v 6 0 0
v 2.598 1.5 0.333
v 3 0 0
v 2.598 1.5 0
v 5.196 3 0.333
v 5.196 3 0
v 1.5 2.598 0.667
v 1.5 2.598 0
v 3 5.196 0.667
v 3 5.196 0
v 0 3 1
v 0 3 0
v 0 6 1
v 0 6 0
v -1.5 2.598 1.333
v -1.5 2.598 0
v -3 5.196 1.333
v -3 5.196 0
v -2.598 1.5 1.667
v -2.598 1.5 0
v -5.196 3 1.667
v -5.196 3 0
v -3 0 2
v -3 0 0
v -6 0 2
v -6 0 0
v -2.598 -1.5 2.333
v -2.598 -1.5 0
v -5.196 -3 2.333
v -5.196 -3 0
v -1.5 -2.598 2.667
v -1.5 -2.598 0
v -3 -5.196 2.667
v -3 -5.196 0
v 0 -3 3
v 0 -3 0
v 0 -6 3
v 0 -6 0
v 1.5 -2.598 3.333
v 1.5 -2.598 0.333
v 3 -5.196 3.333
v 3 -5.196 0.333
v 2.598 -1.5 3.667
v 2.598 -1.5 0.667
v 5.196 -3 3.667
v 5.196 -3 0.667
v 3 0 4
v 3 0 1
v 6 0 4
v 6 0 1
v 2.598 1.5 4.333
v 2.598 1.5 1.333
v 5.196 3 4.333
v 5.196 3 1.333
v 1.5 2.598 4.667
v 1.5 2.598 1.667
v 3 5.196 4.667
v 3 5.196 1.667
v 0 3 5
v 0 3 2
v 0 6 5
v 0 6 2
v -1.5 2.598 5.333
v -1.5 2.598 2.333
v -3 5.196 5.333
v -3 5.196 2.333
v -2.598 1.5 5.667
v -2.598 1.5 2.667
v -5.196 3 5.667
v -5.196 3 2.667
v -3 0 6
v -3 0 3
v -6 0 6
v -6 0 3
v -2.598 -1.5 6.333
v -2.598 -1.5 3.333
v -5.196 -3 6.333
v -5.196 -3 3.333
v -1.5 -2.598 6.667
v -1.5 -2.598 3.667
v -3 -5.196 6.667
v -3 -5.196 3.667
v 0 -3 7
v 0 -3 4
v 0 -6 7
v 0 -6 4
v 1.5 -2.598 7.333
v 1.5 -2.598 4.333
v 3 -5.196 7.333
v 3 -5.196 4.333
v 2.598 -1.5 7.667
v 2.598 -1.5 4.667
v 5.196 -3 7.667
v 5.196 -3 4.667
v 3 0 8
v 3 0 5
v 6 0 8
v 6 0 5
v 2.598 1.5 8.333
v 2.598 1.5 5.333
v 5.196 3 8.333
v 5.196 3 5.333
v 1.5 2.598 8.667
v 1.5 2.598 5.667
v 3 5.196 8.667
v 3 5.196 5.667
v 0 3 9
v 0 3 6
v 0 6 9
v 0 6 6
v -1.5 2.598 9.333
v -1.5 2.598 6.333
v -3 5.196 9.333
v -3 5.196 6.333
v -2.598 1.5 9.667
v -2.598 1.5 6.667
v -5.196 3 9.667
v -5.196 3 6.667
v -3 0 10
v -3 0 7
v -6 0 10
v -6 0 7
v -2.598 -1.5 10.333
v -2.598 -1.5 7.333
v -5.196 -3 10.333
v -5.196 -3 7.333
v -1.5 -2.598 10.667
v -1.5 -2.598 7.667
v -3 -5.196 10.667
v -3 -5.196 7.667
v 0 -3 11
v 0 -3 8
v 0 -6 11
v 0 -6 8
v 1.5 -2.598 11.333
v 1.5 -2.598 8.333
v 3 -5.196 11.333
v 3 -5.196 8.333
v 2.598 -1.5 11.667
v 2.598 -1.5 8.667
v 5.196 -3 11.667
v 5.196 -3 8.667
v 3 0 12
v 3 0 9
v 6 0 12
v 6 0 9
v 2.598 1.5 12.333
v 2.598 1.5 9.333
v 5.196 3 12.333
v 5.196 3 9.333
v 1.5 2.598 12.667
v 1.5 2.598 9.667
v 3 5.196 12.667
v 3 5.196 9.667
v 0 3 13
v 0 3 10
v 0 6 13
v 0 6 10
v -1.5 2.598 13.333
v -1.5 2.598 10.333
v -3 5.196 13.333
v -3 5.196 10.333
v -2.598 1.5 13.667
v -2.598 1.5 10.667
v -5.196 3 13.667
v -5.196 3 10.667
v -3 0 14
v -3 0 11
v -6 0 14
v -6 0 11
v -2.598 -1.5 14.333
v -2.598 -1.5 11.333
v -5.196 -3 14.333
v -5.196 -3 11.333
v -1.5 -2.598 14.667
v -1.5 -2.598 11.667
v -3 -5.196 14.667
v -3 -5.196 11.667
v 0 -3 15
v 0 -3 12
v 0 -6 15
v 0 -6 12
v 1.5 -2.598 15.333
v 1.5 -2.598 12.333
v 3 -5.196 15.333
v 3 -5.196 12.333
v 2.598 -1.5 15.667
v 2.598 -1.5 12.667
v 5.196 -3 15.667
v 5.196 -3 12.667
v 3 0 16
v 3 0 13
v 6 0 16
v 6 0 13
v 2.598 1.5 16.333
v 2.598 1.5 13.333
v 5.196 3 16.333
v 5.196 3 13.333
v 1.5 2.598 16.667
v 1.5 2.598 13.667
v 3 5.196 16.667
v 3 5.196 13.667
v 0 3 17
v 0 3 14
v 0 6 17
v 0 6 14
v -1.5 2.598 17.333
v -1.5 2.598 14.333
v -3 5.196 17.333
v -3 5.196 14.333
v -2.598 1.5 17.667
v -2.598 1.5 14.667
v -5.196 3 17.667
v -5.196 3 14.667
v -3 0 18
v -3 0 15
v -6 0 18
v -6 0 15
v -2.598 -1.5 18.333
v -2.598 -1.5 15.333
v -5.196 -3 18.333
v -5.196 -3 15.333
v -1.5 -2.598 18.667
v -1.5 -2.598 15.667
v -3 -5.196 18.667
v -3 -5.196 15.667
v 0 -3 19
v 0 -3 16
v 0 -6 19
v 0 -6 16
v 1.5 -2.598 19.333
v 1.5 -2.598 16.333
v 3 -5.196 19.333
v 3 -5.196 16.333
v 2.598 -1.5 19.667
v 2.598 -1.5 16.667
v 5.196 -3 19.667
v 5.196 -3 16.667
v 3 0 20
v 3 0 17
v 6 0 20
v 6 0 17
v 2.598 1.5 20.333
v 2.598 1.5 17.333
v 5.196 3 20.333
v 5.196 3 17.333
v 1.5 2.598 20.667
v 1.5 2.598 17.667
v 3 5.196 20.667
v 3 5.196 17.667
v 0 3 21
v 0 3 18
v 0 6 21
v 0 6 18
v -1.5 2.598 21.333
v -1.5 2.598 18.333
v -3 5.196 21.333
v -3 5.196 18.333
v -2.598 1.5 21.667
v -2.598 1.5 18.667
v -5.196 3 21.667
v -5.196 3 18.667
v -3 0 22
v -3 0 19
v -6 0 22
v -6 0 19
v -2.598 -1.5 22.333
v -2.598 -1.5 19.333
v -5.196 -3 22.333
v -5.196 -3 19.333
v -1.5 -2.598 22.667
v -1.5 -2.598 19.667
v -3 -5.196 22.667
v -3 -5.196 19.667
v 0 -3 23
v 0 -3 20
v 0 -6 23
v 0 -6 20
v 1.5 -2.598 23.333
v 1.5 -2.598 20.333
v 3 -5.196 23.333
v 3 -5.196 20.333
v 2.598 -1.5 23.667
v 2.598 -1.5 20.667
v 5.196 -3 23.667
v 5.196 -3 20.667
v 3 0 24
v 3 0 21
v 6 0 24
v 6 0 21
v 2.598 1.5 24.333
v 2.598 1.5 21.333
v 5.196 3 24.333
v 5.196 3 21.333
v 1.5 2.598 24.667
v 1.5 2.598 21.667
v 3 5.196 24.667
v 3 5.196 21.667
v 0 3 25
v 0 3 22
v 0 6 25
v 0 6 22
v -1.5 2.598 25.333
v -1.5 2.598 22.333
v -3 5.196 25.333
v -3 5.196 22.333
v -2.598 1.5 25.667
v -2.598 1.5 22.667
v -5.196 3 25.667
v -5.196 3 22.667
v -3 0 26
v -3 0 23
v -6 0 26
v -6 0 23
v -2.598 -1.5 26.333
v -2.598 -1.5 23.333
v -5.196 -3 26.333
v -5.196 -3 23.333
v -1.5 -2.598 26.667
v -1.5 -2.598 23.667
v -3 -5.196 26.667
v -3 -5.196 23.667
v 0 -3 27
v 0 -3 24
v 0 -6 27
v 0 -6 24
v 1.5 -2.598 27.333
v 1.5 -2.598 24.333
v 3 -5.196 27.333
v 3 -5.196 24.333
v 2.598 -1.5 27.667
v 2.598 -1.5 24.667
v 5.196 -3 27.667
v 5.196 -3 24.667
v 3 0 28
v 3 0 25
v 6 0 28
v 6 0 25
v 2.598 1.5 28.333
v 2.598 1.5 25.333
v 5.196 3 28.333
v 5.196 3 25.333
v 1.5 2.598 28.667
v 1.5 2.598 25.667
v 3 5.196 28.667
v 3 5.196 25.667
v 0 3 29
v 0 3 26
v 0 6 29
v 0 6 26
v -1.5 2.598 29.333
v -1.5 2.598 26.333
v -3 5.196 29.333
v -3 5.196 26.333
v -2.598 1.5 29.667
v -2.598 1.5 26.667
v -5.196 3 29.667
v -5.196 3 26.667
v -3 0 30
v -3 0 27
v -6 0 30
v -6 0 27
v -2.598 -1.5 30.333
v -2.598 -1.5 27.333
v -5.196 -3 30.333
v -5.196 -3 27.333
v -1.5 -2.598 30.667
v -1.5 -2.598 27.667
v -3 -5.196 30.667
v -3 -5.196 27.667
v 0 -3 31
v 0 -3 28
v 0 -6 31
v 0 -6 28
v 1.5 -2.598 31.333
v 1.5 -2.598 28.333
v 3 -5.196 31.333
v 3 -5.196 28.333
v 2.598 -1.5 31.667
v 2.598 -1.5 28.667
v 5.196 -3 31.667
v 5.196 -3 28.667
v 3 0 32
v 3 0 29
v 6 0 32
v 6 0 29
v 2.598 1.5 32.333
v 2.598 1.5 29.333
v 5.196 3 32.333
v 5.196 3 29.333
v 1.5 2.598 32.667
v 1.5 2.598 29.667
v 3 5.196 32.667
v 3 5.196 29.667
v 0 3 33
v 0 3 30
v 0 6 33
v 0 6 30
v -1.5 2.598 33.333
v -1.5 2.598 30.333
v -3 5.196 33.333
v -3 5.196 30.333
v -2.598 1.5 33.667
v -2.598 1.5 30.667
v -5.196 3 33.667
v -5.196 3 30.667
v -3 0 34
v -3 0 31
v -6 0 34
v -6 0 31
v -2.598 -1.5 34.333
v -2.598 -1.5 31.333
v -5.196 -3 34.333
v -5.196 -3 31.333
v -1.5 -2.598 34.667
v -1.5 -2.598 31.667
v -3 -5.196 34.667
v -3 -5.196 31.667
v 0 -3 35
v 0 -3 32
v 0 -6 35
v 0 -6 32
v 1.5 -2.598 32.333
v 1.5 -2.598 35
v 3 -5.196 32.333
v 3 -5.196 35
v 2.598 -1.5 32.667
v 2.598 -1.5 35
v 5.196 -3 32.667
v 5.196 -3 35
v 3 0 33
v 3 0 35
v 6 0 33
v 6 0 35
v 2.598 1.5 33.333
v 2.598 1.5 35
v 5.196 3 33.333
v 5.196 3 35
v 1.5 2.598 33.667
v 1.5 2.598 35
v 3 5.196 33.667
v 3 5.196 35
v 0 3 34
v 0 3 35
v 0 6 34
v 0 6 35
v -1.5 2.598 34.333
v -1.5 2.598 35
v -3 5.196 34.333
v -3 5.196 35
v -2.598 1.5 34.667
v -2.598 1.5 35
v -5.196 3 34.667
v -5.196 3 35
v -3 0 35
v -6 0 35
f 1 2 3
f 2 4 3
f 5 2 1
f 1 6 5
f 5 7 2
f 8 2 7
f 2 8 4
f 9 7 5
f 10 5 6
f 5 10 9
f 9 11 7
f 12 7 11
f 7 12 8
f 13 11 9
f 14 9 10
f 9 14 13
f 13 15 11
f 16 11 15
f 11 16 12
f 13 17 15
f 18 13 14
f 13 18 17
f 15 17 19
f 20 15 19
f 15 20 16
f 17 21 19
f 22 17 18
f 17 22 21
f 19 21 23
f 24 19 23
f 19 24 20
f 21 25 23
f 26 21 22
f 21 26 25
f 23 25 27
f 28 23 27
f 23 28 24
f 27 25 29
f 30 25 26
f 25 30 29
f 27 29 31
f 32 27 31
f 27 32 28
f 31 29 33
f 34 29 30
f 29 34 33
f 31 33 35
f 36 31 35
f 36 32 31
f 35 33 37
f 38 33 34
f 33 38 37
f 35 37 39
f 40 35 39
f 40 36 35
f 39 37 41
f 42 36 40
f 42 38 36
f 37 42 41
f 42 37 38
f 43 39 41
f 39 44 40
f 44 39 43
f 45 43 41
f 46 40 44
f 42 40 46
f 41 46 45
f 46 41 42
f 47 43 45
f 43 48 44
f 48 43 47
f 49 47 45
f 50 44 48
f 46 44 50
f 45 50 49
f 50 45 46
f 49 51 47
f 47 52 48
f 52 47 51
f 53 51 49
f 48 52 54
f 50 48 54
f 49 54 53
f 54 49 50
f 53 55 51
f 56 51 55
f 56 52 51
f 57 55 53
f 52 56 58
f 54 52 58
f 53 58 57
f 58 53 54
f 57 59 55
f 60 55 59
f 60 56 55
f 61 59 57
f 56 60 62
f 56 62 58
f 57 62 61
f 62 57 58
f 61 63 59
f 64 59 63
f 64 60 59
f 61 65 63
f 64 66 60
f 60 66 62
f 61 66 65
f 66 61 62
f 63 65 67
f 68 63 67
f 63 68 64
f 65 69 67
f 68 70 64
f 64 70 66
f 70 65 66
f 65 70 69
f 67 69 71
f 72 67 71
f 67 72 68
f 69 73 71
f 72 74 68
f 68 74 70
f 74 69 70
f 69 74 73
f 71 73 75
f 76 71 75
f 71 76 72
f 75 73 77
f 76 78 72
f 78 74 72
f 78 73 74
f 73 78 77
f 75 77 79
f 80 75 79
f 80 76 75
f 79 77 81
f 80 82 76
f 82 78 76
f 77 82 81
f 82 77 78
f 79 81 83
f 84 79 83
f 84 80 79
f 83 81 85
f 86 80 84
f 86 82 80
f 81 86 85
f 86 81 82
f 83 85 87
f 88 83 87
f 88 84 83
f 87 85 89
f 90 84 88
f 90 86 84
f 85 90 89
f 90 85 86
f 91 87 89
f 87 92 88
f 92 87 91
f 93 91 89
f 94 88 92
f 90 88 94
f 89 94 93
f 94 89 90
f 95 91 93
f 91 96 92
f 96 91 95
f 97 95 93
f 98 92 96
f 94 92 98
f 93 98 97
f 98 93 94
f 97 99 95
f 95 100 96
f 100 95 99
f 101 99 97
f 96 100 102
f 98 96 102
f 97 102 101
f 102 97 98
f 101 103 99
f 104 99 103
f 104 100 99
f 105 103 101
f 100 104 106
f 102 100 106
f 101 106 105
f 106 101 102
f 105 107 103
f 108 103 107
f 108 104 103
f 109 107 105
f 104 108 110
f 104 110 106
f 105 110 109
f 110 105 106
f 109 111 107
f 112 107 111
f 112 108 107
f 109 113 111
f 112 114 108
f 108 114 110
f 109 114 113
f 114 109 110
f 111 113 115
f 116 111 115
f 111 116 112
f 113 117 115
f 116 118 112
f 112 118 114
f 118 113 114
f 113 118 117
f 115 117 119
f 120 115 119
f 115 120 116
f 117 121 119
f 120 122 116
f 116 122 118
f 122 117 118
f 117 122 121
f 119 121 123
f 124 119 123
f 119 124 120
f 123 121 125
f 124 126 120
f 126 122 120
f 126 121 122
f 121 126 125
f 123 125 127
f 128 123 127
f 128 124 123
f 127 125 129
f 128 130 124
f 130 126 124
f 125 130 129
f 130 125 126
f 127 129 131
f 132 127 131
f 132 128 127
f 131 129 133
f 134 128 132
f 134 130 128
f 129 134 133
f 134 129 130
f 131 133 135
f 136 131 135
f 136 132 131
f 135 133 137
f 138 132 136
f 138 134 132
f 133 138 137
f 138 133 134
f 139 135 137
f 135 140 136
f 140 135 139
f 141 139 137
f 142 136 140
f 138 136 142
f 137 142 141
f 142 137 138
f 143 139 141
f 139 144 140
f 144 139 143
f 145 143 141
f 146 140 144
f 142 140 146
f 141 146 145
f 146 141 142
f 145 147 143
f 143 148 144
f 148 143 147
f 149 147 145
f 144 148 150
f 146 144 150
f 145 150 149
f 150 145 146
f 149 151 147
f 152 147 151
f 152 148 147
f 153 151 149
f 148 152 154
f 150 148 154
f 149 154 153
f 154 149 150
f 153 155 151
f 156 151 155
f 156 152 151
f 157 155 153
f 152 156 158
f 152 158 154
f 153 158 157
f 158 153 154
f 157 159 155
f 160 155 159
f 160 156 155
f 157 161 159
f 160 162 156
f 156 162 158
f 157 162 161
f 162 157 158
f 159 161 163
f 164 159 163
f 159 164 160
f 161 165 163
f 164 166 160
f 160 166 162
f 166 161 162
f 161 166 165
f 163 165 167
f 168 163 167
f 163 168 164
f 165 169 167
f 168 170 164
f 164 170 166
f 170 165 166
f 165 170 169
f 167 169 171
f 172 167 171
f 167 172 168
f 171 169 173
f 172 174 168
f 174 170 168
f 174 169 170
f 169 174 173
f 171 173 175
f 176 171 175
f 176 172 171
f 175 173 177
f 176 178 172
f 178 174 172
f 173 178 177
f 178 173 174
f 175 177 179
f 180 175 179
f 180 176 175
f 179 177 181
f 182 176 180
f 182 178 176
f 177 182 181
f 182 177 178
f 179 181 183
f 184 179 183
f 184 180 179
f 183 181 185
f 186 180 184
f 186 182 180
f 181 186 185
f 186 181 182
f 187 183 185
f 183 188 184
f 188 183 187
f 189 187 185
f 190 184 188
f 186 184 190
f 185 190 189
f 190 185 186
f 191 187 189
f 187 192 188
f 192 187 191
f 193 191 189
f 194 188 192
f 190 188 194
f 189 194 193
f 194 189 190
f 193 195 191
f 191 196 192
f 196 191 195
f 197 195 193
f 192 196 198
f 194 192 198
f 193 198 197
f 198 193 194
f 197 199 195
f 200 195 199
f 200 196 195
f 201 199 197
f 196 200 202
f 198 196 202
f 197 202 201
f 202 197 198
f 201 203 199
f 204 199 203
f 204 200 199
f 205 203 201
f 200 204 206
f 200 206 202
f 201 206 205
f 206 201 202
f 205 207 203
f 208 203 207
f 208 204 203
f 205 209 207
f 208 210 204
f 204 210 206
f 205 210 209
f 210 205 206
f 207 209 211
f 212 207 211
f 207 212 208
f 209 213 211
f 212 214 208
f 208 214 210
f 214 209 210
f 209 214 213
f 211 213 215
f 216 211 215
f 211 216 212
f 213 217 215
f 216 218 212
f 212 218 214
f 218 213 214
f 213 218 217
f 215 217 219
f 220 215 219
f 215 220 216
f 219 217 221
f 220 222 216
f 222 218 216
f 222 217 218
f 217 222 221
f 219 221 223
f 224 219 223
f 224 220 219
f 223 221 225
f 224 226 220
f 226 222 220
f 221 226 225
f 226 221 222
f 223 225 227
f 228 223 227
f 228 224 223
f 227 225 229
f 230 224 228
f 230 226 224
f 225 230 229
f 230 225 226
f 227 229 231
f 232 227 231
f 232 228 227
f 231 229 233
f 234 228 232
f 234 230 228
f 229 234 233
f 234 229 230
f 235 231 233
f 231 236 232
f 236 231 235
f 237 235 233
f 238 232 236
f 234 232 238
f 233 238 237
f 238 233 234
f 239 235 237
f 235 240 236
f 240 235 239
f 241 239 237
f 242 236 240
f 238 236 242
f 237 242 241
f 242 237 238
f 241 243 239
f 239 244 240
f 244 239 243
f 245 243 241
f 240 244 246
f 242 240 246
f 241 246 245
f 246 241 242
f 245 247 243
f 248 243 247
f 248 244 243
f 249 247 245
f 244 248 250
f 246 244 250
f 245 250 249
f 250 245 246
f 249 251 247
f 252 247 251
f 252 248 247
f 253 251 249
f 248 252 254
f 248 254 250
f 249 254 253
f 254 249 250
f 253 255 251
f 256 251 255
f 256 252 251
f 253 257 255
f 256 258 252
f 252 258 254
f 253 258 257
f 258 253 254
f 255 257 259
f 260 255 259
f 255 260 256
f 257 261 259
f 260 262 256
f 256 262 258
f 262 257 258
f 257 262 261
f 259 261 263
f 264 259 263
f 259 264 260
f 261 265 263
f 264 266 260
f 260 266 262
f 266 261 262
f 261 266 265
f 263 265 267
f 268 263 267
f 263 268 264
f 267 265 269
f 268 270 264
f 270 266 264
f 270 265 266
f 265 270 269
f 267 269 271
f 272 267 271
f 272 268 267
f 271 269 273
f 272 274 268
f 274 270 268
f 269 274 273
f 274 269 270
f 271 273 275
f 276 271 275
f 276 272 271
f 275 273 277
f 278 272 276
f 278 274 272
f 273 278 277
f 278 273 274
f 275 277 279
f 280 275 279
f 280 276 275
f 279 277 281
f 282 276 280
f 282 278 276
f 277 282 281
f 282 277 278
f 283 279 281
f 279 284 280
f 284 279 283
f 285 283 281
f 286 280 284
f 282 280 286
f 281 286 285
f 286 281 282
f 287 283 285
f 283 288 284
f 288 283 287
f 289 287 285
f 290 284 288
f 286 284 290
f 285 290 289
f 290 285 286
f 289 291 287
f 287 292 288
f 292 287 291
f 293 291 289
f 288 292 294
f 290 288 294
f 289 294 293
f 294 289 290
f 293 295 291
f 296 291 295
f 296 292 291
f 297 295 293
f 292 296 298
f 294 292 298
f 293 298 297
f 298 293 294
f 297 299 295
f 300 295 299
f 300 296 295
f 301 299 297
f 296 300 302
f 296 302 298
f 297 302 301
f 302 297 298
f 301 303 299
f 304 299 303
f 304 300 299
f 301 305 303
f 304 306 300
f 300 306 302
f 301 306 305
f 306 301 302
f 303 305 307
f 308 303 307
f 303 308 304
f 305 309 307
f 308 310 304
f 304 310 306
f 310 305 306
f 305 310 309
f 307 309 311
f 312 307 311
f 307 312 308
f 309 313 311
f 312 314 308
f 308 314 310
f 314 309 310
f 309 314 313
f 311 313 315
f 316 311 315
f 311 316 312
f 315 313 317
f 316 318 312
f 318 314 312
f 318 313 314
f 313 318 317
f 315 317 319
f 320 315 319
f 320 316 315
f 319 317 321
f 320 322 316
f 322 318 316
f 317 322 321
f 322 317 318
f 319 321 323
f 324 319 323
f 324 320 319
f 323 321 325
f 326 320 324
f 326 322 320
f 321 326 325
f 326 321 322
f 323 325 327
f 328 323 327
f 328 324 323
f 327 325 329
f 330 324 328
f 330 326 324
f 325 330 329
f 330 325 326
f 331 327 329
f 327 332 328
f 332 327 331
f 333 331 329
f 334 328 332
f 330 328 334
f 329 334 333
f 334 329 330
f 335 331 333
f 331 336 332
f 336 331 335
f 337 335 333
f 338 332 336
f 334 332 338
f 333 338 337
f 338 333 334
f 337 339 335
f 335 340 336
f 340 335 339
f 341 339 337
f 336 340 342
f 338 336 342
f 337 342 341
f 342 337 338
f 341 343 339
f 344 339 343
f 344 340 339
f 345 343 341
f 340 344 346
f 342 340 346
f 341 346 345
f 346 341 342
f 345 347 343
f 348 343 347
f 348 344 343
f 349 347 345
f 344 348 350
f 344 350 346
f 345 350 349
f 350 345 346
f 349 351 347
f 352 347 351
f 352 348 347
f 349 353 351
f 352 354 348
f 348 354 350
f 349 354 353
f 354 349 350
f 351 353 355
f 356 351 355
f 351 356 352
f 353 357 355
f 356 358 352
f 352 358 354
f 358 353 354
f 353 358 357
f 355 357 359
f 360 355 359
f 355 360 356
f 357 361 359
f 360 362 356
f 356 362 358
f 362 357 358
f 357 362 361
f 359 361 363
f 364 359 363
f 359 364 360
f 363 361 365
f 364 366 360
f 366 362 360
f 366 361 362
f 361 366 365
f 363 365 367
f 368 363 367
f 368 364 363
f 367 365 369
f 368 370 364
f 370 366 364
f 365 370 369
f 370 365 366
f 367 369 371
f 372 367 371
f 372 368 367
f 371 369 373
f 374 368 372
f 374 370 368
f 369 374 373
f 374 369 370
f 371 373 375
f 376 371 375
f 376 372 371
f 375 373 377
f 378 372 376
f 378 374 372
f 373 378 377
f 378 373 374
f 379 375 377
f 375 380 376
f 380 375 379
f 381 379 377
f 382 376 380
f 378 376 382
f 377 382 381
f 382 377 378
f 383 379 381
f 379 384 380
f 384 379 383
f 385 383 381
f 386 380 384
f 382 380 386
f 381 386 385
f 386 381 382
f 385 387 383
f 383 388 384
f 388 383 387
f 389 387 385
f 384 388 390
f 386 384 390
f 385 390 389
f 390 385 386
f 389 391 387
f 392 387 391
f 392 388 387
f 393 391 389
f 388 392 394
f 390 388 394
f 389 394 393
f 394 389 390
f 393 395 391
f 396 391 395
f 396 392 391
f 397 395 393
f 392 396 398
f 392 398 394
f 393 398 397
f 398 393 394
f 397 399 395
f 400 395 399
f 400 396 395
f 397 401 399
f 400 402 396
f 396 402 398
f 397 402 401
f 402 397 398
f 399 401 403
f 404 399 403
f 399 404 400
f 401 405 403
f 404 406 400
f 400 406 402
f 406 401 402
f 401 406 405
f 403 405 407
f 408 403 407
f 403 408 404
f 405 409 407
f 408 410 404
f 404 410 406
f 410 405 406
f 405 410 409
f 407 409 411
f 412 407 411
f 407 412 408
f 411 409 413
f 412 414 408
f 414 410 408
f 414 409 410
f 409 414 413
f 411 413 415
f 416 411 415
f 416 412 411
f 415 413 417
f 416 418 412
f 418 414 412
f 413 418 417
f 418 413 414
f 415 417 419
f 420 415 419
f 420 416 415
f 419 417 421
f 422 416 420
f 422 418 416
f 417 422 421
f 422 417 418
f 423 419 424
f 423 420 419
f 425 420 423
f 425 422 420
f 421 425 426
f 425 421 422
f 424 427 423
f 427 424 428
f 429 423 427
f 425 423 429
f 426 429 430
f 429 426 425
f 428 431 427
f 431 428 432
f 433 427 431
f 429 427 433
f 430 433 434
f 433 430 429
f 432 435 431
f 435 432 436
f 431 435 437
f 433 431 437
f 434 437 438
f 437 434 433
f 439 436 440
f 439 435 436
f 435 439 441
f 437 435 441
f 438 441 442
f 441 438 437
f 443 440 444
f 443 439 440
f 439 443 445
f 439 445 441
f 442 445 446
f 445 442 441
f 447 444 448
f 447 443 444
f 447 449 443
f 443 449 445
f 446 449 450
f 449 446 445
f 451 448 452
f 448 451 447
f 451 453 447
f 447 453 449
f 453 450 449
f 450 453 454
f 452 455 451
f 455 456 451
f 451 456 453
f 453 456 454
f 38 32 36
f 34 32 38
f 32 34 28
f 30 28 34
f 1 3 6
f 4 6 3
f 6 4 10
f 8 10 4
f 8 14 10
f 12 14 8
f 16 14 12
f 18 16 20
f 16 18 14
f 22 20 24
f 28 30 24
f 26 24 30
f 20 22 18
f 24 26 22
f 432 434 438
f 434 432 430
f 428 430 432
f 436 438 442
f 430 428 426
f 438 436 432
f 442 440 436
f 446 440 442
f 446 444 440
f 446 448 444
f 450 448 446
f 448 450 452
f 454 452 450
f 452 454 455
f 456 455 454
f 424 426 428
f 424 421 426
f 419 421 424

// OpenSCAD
/*
	方形弹簧,screw_h螺线高,step密度,r螺线外半径,w弹簧线宽度
*/
module spring_step(r=3,w=2,step=10,screw_h=3)
{
	union()
	{
		for(a=[0:360/step:360-360/step])
		{
			hull()
			{
				rotate([0,0,a])translate([r-w,0,screw_h*a/360])cube([w,0.0001,w]);
				rotate([0,0,a+360/step])translate([r-w,0,screw_h*(a+360/step)/360])cube([w,0.0001,w]);
			}
		}
	}
}

module spring(r=6,w=3,step=12,h=35,screw_h=4)
{
	difference()
	{
		translate([0,0,-w])
		union()
		{
			for(n=[0:screw_h:h+screw_h])
			{
				translate([0,0,n])spring_step(r,w,step,screw_h);
			}
		}
		//消减两端
		translate([0,0,-2*w])cylinder(r=r+w,h=2*w);
		translate([0,0,h])cylinder(r=r+w,h=4*w);
	}
}

spring();
